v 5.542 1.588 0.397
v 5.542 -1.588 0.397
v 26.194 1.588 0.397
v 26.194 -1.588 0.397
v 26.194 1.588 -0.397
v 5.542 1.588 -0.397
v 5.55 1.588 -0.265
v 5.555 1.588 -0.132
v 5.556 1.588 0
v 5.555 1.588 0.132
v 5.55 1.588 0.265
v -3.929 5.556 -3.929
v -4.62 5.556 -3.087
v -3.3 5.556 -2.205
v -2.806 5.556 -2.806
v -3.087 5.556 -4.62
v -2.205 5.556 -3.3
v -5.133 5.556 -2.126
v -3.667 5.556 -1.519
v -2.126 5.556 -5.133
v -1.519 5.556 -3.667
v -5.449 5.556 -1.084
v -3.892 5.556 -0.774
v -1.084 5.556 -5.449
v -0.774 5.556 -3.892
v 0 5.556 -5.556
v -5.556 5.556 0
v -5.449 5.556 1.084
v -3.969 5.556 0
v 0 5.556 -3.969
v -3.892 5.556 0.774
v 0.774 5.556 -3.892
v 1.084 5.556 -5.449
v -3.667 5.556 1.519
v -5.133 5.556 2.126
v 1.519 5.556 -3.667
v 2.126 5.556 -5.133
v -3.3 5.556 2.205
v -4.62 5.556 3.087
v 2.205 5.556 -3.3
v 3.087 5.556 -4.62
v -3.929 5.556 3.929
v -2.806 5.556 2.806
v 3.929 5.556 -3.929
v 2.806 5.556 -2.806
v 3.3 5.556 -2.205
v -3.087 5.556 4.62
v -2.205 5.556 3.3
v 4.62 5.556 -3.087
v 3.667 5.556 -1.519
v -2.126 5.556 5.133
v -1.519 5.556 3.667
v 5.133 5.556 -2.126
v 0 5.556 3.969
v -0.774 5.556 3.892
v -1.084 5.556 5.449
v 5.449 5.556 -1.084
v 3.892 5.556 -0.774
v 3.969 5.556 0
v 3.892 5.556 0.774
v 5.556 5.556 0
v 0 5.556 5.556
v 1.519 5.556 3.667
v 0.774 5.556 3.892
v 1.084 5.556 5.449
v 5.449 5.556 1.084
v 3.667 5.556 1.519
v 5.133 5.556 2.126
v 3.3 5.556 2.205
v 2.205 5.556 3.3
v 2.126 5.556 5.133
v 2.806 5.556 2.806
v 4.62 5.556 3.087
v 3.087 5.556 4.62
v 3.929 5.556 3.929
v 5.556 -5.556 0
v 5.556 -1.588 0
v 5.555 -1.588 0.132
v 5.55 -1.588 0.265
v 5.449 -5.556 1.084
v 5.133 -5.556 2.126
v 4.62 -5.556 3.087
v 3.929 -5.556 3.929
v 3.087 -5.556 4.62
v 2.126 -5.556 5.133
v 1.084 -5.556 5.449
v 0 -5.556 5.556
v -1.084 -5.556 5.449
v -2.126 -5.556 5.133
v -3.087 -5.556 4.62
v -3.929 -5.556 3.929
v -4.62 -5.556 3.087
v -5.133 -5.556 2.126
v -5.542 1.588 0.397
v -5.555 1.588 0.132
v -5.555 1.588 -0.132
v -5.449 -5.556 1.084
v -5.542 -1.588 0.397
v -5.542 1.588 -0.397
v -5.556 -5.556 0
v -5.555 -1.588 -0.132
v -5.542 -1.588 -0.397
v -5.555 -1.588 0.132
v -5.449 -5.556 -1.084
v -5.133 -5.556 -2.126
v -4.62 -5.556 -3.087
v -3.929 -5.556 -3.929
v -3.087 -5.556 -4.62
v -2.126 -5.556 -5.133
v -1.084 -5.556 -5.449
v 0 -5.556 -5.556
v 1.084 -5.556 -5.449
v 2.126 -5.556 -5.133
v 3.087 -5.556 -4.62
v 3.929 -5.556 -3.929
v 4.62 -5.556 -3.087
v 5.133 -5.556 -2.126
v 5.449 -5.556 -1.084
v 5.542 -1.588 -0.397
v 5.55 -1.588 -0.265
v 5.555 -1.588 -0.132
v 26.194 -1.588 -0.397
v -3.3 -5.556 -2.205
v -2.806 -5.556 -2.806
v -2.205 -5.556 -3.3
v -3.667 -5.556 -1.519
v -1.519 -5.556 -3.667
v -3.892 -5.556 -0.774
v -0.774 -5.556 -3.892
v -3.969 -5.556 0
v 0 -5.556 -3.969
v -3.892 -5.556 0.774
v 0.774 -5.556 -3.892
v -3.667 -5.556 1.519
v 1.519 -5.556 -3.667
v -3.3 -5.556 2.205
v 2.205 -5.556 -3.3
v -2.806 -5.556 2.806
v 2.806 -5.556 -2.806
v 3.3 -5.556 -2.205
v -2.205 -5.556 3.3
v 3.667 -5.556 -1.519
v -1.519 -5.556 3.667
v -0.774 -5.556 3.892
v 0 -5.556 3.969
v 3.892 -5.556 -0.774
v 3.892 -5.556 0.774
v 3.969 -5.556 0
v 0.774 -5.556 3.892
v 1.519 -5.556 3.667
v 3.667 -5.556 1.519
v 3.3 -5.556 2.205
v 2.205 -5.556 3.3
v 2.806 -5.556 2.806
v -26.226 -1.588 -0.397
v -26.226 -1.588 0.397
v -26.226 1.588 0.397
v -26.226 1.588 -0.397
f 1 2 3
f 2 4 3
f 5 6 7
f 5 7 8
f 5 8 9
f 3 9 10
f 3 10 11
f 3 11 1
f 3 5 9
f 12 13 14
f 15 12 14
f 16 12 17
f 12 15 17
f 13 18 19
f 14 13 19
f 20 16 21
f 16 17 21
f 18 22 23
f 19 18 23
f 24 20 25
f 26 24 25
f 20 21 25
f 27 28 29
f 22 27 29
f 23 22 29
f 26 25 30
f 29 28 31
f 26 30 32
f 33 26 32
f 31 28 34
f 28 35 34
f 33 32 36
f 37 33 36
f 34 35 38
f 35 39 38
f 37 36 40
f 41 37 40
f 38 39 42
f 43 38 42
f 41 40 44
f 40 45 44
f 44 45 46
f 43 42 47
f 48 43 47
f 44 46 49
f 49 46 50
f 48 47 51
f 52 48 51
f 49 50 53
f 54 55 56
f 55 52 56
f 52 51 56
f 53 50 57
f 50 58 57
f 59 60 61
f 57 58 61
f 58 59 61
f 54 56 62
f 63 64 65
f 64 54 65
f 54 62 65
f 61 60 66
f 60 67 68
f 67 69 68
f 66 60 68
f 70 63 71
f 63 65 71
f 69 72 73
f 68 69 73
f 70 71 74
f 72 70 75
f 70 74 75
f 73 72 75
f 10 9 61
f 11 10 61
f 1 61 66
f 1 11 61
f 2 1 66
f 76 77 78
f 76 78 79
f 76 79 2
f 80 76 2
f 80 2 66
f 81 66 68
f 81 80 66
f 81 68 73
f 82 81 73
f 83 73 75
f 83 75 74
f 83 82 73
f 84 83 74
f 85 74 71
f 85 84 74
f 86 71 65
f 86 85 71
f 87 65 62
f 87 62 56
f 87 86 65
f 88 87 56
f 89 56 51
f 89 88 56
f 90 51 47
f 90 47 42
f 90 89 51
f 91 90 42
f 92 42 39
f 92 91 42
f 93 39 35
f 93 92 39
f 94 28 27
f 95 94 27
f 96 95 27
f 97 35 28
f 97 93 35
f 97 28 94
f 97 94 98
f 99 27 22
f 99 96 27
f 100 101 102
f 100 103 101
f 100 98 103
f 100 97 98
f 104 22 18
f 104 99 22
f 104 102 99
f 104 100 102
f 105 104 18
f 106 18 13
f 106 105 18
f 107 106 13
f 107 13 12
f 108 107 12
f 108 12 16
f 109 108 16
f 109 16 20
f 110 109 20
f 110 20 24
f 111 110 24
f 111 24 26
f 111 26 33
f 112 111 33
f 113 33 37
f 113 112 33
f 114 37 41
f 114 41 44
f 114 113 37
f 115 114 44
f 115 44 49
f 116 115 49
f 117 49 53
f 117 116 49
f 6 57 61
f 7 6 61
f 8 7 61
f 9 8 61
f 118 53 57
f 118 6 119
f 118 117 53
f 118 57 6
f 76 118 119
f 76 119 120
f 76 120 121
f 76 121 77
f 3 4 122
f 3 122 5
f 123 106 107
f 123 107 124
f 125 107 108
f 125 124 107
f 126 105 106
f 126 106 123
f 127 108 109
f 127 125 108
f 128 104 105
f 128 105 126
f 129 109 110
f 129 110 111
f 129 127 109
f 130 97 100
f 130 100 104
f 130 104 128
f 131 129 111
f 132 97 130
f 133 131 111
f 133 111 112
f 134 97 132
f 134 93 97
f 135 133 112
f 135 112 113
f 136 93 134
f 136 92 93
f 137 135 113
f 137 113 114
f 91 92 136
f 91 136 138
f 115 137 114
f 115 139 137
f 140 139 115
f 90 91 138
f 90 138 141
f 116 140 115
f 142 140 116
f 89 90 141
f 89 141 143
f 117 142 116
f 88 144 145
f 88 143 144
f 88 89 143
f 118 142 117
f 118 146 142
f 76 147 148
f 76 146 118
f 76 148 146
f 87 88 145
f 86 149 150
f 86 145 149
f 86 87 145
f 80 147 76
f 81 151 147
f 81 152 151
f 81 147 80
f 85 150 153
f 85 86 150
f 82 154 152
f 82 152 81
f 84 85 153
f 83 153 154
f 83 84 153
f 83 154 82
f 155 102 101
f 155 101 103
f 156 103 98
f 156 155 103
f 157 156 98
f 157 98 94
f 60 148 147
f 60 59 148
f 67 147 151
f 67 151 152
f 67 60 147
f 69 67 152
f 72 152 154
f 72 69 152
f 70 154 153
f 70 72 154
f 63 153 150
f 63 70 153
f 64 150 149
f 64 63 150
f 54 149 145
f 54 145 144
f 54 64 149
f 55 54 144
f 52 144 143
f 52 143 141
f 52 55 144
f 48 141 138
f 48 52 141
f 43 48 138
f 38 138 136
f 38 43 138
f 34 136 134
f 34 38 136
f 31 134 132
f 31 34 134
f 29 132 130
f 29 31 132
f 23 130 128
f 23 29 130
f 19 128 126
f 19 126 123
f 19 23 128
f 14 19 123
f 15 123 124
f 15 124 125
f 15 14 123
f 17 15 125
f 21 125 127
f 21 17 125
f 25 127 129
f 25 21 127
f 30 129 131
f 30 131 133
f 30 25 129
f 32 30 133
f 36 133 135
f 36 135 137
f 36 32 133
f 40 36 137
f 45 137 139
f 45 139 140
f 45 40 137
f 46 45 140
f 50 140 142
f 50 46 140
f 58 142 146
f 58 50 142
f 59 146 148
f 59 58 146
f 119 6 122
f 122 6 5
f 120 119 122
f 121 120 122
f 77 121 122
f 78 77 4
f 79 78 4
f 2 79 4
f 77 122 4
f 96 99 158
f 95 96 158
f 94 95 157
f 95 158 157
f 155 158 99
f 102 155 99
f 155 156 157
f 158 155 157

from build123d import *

# Parameters (mm, degrees)
F0_R      = 5.55625
F0_R_2    = 3.96875
F1_DEPTH  = 5.55625
F3_DEPTH  = 5.55625
F4_DEPTH  = 5.55625
F2_W      = 20.6375
F2_H      = 3.175
F2_W_2    = 20.66925
F5_DEPTH  = 0.396875
F6_DEPTH  = 0.396875
F7_DEPTH  = 0.396875
F8_DEPTH  = 0.396875
F9_DEPTH  = 0.0141922326
F10_DEPTH = 0.0141922326


with BuildPart() as f1:
    # F0 (on Front) → F1 (new body)
    with BuildSketch(Plane.XZ):
        Circle(F0_R)
        Circle(F0_R_2, mode=Mode.SUBTRACT)
    extrude(amount=F1_DEPTH)

    # F0 (on Front) → F3 (join)
    with BuildSketch(Plane.XZ):
        Circle(F0_R)
        Circle(F0_R_2, mode=Mode.SUBTRACT)
    extrude(amount=F3_DEPTH)

    # F4 (add): a face of the model
    f4_faces = [f1.faces().sort_by_distance(p)[0] for p in [
        (-5.3990955179, 0, 0),
    ]]
    extrude(f4_faces, amount=F4_DEPTH)

    # F2 (on Top) → F5 (join)
    with BuildSketch(Plane.XY):
        with Locations((15.875, 0)):
            Rectangle(F2_W, F2_H)
        with Locations((-15.890875, 0)):
            Rectangle(F2_W_2, F2_H)
    extrude(amount=F5_DEPTH)

    # F6 (add): a face of the model
    f6_faces = [f1.faces().sort_by_distance(p)[0] for p in [
        (15.875, 0, 0),
    ]]
    extrude(f6_faces, amount=F6_DEPTH)

    # F2 (on Top) → F7 (join)
    with BuildSketch(Plane.XY):
        with Locations((-15.890875, 0)):
            Rectangle(F2_W_2, F2_H)
    extrude(amount=F7_DEPTH)

    # F8 (add): a face of the model
    f8_faces = [f1.faces().sort_by_distance(p)[0] for p in [
        (-15.890875, 0, 0),
    ]]
    extrude(f8_faces, amount=F8_DEPTH)

    # F9 (add, through all): faces of the model
    f9_faces = [f1.faces().sort_by_distance(p)[0] for p in [
        (5.55625, 0, 0.1984375),
        (5.55625, 0, -0.1984375),
    ]]
    extrude(f9_faces, amount=F9_DEPTH)

    # F10 (add, through all): faces of the model
    f10_faces = [f1.faces().sort_by_distance(p)[0] for p in [
        (-5.55625, 0, 0.1984375),
        (-5.55625, 0, -0.1984375),
    ]]
    extrude(f10_faces, amount=F10_DEPTH)

    # F11: union 


solid = f1.part
